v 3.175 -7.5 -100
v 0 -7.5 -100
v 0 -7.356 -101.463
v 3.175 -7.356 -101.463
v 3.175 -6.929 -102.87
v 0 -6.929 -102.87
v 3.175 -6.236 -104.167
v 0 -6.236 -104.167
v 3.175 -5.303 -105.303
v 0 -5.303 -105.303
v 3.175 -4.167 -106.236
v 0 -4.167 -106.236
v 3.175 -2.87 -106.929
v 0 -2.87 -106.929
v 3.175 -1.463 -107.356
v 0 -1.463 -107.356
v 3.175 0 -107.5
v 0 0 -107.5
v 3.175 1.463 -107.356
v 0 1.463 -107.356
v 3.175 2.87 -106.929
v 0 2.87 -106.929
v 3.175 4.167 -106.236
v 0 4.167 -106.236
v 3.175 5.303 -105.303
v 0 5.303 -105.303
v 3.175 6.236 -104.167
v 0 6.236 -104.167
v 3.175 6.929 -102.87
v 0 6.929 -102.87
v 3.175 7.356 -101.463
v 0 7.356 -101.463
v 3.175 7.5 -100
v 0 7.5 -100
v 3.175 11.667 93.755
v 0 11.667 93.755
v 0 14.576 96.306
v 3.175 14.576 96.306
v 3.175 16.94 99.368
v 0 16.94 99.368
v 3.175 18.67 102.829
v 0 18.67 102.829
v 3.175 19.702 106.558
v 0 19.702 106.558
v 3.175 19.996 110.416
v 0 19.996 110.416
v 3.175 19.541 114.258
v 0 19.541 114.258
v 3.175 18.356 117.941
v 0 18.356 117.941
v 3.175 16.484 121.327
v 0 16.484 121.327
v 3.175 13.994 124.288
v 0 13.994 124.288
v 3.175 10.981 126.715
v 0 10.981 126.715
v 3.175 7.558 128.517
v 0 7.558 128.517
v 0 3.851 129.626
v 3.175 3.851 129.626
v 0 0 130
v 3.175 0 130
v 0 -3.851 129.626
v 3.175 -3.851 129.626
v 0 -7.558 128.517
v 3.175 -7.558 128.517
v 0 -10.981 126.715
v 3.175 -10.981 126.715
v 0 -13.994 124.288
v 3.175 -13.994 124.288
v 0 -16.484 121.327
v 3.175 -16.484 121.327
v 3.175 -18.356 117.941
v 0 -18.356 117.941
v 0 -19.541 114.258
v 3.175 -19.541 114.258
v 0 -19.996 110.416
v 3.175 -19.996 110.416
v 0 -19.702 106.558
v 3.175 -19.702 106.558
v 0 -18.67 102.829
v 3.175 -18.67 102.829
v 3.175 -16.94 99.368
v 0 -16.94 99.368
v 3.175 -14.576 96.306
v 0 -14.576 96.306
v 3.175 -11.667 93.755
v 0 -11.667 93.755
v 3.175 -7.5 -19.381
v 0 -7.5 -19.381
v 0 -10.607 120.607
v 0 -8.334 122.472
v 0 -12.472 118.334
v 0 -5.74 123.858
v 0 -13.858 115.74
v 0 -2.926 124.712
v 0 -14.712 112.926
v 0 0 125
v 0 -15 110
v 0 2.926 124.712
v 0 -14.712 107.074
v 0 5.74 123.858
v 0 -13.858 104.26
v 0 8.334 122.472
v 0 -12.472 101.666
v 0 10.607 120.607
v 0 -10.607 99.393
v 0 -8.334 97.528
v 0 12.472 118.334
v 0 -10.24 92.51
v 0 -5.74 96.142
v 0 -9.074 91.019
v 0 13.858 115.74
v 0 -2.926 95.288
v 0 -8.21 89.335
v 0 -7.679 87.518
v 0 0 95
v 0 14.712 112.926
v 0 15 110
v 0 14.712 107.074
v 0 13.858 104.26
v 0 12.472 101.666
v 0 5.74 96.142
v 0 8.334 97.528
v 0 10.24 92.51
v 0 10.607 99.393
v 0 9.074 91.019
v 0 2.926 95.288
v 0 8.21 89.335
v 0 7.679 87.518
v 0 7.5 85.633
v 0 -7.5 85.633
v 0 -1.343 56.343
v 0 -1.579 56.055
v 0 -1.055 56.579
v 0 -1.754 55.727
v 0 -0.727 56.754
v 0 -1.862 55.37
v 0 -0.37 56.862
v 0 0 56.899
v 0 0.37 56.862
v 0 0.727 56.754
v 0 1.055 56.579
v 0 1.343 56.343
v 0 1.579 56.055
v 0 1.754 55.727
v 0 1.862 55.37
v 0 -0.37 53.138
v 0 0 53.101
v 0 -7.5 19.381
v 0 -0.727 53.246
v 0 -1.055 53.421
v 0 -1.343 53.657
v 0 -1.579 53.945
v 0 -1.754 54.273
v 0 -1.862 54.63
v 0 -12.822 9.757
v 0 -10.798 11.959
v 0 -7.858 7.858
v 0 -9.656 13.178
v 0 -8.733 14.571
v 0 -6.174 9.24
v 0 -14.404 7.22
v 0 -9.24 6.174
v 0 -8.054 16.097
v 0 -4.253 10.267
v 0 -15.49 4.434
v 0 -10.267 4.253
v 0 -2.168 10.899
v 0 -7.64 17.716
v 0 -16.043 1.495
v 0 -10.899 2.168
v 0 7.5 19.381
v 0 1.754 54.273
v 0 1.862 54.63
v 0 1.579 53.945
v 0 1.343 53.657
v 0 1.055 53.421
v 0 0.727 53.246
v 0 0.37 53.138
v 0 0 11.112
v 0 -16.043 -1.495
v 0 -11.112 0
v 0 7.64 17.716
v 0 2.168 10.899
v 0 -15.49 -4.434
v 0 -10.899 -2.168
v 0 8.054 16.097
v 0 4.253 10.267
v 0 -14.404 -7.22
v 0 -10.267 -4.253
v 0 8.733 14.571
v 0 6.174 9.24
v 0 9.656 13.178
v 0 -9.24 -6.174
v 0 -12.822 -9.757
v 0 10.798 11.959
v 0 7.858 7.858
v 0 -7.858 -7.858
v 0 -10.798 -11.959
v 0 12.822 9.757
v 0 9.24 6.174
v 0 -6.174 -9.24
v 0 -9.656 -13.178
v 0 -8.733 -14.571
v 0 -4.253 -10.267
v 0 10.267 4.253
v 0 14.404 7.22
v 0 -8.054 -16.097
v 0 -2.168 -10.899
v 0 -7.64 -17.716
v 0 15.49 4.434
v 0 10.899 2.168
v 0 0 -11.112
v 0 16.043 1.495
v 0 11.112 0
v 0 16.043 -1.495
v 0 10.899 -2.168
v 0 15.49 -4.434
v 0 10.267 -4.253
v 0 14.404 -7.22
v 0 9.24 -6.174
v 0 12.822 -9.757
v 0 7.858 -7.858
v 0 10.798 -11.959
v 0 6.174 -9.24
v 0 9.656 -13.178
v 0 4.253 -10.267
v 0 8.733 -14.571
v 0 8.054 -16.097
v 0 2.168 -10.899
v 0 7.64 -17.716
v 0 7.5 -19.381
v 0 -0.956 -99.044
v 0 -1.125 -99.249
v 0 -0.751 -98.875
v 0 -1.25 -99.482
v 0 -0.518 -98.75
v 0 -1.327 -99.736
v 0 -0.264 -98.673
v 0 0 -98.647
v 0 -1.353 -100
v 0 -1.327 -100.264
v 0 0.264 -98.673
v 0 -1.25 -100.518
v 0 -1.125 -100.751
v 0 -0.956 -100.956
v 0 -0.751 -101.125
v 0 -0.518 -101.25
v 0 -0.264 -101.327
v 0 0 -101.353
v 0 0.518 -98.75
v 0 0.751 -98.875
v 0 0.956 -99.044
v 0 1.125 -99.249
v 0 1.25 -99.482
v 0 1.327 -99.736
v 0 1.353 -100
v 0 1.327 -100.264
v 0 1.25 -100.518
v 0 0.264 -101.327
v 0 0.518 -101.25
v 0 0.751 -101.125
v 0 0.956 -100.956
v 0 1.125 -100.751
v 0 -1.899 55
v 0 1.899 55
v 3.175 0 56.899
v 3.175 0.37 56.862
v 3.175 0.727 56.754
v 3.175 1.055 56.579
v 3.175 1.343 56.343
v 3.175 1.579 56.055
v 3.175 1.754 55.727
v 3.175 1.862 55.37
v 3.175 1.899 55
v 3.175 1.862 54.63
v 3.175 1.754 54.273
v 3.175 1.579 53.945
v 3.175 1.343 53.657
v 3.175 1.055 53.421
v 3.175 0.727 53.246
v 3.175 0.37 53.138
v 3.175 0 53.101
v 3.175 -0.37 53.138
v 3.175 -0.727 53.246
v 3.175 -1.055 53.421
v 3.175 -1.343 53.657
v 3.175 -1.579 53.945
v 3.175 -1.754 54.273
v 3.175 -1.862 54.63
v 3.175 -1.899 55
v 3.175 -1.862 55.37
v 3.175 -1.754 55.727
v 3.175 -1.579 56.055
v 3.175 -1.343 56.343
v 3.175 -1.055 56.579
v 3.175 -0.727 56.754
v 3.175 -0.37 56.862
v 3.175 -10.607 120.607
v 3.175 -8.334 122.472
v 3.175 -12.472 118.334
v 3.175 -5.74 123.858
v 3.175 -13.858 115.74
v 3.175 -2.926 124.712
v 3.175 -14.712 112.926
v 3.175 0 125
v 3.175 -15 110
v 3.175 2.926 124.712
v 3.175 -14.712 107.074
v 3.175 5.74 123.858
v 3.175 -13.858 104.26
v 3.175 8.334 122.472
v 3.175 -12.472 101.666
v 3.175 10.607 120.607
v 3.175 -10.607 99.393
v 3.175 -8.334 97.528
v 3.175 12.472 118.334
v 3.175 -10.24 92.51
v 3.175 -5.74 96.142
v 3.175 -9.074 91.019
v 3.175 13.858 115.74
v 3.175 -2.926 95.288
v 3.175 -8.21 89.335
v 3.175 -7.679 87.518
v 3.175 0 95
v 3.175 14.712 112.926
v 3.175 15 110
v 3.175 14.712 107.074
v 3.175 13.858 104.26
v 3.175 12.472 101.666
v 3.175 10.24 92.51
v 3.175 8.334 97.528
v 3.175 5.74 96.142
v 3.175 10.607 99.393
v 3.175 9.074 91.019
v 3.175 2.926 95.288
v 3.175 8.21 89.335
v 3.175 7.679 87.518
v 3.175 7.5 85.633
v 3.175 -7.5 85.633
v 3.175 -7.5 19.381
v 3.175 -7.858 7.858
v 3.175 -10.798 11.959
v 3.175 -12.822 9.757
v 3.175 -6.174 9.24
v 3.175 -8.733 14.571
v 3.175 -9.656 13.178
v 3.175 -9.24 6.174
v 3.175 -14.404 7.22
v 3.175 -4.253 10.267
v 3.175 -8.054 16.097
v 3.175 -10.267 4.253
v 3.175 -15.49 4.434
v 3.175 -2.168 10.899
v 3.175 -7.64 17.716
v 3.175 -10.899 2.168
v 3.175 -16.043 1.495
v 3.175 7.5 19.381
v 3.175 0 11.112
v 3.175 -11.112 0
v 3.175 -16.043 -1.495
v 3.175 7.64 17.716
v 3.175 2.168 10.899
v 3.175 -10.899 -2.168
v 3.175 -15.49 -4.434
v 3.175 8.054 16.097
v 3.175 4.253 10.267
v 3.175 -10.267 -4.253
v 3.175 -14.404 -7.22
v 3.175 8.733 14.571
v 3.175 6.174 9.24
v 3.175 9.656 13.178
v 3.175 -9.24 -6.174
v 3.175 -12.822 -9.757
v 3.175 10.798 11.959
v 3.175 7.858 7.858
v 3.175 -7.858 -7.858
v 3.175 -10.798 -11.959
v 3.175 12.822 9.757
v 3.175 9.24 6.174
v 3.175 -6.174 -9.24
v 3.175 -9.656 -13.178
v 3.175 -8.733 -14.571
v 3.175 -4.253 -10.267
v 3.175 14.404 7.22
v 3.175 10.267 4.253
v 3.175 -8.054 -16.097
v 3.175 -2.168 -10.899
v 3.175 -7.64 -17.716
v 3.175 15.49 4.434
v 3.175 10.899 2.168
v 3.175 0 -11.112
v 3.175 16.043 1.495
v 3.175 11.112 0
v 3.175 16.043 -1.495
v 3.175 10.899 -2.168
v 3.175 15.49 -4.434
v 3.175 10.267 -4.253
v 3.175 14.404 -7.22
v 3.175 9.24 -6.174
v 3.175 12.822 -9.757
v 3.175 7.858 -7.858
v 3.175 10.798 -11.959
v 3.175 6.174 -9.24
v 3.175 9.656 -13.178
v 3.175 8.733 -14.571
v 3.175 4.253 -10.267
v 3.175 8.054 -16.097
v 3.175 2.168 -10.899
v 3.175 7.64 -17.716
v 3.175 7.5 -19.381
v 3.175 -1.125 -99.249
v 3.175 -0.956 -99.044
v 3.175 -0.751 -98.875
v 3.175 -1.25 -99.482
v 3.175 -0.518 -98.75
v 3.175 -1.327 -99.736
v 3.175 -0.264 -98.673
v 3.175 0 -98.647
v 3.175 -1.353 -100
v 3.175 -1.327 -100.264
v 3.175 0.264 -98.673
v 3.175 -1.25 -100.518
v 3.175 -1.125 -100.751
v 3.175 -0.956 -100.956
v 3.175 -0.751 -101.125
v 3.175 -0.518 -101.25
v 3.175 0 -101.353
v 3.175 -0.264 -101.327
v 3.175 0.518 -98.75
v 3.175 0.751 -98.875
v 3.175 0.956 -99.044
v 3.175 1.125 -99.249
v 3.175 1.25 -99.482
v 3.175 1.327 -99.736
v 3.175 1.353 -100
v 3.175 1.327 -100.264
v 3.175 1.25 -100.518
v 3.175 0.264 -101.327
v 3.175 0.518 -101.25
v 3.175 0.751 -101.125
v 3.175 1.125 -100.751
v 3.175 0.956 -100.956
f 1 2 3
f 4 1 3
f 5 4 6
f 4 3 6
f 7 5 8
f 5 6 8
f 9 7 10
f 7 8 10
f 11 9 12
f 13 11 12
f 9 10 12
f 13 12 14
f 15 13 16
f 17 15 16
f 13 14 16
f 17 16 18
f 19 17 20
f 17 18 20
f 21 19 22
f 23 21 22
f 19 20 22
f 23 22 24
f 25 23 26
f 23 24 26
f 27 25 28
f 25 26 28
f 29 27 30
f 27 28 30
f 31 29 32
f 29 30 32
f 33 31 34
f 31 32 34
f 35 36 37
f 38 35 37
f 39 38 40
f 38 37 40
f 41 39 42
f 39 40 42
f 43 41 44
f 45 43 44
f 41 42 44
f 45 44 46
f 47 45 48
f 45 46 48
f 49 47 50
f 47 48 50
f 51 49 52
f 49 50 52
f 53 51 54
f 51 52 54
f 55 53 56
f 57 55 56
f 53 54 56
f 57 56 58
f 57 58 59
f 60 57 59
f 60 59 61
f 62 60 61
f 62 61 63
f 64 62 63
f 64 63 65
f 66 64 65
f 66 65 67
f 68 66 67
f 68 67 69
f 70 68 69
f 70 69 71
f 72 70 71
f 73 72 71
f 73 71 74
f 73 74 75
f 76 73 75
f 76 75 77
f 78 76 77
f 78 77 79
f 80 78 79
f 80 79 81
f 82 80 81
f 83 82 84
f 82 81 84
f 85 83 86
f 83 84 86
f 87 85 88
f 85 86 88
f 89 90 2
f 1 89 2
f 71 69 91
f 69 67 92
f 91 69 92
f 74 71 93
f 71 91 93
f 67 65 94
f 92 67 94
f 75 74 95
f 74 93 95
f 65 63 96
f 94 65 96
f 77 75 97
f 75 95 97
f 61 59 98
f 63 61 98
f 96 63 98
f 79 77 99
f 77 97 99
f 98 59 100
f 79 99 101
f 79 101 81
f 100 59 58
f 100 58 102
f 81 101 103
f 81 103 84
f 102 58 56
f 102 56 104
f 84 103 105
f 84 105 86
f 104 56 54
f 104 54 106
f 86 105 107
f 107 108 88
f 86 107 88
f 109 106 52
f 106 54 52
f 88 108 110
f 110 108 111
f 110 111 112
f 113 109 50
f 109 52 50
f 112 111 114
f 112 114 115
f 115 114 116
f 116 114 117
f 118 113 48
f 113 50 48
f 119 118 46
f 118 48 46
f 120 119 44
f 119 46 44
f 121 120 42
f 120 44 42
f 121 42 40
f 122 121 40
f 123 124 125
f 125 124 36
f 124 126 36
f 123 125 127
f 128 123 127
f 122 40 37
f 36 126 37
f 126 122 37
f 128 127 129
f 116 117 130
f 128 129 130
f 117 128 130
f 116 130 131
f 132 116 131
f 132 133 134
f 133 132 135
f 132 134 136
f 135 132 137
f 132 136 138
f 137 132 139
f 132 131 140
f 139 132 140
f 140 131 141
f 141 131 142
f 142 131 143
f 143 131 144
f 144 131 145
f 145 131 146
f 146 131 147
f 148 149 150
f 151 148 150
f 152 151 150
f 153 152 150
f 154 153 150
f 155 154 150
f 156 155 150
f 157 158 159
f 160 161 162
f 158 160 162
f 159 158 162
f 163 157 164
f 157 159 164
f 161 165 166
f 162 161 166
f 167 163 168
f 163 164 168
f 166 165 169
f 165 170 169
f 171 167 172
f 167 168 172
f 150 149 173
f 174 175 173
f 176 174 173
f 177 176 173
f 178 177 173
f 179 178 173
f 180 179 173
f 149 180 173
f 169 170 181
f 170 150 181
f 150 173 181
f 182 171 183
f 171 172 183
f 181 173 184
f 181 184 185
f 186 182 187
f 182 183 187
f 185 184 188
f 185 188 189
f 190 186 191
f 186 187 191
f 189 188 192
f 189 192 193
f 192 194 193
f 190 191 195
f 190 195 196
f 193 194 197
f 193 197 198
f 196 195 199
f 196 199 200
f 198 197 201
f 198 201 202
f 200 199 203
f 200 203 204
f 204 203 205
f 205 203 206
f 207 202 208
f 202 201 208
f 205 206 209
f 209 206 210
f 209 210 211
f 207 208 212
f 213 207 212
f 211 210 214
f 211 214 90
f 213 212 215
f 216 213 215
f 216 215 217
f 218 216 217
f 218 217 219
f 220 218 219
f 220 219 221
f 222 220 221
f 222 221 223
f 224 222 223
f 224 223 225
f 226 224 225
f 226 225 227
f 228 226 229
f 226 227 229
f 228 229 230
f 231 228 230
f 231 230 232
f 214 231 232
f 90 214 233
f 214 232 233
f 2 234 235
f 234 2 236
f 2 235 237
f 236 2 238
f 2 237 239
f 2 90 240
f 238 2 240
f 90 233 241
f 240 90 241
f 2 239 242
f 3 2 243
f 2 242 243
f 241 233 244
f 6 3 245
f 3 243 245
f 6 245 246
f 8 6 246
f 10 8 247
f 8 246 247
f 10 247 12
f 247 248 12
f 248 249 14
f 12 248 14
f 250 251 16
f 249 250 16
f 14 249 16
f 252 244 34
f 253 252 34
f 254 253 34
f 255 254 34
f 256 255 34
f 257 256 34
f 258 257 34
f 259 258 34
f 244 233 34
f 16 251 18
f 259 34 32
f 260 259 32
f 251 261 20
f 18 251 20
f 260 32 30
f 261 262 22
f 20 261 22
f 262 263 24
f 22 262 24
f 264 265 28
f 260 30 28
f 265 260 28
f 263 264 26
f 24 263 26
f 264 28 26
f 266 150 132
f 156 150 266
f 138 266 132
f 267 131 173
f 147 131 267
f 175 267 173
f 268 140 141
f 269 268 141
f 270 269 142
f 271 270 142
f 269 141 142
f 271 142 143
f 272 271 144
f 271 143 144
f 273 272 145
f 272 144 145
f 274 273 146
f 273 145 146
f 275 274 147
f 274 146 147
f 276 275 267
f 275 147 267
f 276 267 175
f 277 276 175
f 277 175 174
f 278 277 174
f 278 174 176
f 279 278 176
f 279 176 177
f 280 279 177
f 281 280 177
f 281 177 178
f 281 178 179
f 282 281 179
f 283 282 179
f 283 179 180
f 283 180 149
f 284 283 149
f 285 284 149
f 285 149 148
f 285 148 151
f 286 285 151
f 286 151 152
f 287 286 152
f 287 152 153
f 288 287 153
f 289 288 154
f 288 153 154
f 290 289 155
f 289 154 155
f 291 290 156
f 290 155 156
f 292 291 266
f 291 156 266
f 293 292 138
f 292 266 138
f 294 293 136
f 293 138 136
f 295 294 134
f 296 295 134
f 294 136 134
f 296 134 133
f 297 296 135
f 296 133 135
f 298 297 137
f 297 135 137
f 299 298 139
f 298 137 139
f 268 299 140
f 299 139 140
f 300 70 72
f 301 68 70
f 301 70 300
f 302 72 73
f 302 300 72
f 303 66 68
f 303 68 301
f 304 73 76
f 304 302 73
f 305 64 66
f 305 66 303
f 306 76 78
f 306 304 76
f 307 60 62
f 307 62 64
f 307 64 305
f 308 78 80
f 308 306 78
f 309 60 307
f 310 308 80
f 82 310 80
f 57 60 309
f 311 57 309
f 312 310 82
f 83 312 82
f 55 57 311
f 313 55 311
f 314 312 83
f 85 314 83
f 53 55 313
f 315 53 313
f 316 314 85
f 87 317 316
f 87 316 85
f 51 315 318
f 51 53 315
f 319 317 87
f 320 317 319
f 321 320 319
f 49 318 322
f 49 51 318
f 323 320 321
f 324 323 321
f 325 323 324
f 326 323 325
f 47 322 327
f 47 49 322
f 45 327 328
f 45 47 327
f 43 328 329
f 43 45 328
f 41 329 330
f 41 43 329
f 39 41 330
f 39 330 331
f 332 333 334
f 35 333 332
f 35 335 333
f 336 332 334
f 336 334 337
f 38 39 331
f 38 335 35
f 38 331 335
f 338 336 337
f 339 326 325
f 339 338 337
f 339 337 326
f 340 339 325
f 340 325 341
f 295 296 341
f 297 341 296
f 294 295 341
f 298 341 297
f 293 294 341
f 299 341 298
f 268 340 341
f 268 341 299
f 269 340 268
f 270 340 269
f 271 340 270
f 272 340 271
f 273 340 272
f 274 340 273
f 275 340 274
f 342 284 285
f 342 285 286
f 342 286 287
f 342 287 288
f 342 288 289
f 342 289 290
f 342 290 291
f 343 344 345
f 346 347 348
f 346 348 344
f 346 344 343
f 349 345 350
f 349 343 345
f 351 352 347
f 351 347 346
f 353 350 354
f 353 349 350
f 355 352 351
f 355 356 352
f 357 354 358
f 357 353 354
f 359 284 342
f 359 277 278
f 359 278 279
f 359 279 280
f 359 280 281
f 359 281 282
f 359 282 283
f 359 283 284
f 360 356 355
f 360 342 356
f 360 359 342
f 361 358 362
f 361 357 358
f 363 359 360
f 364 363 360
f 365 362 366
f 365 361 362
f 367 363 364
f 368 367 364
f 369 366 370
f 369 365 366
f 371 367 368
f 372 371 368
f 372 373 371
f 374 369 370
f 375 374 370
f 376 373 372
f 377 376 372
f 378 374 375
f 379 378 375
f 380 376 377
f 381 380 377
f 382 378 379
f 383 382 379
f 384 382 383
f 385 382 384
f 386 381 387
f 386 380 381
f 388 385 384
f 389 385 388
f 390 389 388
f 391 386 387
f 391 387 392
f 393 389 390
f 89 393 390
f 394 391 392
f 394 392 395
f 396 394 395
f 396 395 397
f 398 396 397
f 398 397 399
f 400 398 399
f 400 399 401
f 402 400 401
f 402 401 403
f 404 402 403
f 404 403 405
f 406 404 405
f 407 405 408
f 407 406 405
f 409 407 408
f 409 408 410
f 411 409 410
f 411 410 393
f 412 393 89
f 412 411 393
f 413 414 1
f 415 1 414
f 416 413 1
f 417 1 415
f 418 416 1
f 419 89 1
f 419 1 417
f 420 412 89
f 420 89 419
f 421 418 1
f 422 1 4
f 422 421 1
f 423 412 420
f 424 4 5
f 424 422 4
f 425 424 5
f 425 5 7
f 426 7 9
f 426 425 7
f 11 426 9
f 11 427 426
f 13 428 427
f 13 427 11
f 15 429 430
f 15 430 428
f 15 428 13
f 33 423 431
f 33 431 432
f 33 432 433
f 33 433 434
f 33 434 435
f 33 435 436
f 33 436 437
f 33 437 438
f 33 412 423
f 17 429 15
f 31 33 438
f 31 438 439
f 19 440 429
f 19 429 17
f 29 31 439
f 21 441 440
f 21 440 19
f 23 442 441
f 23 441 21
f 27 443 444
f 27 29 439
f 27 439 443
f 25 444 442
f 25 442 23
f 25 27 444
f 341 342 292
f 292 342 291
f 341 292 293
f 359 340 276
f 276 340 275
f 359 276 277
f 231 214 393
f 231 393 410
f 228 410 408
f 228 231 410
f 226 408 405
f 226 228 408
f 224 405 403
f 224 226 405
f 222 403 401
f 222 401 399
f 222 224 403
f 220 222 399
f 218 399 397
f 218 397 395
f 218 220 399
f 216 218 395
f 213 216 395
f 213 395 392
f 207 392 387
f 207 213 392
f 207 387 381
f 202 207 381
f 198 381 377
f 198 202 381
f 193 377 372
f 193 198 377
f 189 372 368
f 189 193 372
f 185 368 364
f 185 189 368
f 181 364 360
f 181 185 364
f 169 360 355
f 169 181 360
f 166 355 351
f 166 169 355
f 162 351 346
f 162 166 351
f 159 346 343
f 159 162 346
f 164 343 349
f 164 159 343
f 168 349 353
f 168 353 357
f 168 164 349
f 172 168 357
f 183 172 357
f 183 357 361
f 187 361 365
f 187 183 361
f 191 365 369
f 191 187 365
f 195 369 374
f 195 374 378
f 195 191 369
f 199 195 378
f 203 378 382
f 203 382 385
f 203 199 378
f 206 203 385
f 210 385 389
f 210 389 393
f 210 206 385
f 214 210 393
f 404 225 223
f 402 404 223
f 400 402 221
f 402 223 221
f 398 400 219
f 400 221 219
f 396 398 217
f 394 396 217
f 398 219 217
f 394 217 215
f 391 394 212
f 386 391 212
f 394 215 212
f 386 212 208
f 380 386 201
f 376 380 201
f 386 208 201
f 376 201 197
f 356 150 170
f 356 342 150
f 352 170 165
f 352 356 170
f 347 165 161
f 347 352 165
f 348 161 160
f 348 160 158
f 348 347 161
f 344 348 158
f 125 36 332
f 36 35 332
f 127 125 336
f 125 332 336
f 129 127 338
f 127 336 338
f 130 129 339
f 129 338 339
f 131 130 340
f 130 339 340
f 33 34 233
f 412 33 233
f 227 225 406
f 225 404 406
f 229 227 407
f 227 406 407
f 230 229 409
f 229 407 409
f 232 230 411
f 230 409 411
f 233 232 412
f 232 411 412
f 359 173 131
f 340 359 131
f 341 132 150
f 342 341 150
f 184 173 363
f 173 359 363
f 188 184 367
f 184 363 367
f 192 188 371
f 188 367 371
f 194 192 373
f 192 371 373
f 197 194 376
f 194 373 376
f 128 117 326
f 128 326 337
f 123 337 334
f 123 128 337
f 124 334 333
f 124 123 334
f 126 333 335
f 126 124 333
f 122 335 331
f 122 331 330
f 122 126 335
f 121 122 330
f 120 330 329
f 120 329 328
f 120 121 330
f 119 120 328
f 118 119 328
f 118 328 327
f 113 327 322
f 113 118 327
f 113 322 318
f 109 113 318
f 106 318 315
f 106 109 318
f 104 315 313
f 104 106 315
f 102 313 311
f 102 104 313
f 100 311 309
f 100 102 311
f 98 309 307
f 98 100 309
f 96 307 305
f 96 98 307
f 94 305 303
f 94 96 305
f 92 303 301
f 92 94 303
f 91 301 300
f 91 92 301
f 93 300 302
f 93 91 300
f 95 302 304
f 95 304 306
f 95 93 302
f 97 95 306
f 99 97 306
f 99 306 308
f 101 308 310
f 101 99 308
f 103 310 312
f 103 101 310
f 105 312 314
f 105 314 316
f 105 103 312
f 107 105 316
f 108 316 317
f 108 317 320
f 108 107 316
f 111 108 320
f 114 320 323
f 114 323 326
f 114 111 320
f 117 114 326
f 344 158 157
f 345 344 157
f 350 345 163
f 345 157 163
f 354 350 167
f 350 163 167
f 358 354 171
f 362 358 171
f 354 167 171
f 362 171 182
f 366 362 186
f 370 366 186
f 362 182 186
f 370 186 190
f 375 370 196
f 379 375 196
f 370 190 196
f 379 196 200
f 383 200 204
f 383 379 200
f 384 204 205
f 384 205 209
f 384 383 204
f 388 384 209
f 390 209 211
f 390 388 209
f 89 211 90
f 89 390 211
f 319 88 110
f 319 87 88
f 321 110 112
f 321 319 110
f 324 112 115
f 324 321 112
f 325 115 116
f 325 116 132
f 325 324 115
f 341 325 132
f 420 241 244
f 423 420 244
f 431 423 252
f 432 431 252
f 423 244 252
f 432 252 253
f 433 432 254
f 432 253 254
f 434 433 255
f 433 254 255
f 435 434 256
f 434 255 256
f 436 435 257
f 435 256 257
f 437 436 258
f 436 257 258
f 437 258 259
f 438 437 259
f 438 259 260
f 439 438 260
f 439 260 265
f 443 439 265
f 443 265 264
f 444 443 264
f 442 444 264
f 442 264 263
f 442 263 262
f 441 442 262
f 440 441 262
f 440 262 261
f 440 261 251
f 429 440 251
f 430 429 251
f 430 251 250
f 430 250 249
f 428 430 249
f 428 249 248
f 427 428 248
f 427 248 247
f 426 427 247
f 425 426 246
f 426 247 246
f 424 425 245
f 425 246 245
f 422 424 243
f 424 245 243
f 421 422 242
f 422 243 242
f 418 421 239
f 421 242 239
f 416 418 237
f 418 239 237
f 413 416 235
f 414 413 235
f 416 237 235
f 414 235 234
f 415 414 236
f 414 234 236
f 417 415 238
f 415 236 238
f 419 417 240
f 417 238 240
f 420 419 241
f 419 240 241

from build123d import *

# Parameters (mm, degrees)
SKETCH1_R             = 15
SKETCH1_R_2           = 11.1125
BOSS_EXTRUDE1_DEPTH   = 3.175
F_6_CLEARANCE_HOLE1_D = 3.7973
F_6_32_TAPPED_HOLE1_D = 2.7051
FILLET1_R             = 10


with BuildPart() as part:
    # Sketch1 → Boss-Extrude1 (new body)
    with BuildSketch(Plane(origin=(0, 0, 0), x_dir=(0, 0, -1), z_dir=(1, 0, 0))):
        with BuildLine():
            ThreePointArc((-91.459503782, 7.5), (-130, 0), (-91.459503782, -7.5))
            Line((-91.459503782, -7.5), (-14.260527909, -7.5))
            ThreePointArc((-14.260527909, -7.5), (0, -16.1125), (14.260527909, -7.5))
            Line((14.260527909, -7.5), (100, -7.5))
            ThreePointArc((100, -7.5), (107.5, 0), (100, 7.5))
            Line((100, 7.5), (14.260527909, 7.5))
            ThreePointArc((14.260527909, 7.5), (0, 16.1125), (-14.260527909, 7.5))
            Line((-14.260527909, 7.5), (-91.459503782, 7.5))
        make_face()
        with Locations((-110, 0)):
            Circle(SKETCH1_R, mode=Mode.SUBTRACT)
        Circle(SKETCH1_R_2, mode=Mode.SUBTRACT)
    extrude(amount=BOSS_EXTRUDE1_DEPTH)

    # #6 Clearance Hole1 (through all)
    with Locations(Plane(origin=(3.175, 0, 0), x_dir=(0, 0, -1), z_dir=(1, 0, 0))):
        with Locations((-55, 0)):
            Hole(F_6_CLEARANCE_HOLE1_D / 2)

    # #6-32 Tapped Hole1 (through all)
    with Locations(Plane(origin=(3.175, 0, 0), x_dir=(0, 0, -1), z_dir=(1, 0, 0))):
        with Locations((100, 0)):
            Hole(F_6_32_TAPPED_HOLE1_D / 2)

    # Fillet1
    fillet1_edges = [part.edges().sort_by_distance(p)[0] for p in [
        (1.5875, 7.5, 91.459503782),
        (1.5875, 7.5, 14.260527909),
        (1.5875, 7.5, -14.260527909),
        (1.5875, -7.5, -14.260527909),
        (1.5875, -7.5, 14.260527909),
        (1.5875, -7.5, 91.459503782),
    ]]
    fillet(fillet1_edges, radius=FILLET1_R)


solid = part.part
